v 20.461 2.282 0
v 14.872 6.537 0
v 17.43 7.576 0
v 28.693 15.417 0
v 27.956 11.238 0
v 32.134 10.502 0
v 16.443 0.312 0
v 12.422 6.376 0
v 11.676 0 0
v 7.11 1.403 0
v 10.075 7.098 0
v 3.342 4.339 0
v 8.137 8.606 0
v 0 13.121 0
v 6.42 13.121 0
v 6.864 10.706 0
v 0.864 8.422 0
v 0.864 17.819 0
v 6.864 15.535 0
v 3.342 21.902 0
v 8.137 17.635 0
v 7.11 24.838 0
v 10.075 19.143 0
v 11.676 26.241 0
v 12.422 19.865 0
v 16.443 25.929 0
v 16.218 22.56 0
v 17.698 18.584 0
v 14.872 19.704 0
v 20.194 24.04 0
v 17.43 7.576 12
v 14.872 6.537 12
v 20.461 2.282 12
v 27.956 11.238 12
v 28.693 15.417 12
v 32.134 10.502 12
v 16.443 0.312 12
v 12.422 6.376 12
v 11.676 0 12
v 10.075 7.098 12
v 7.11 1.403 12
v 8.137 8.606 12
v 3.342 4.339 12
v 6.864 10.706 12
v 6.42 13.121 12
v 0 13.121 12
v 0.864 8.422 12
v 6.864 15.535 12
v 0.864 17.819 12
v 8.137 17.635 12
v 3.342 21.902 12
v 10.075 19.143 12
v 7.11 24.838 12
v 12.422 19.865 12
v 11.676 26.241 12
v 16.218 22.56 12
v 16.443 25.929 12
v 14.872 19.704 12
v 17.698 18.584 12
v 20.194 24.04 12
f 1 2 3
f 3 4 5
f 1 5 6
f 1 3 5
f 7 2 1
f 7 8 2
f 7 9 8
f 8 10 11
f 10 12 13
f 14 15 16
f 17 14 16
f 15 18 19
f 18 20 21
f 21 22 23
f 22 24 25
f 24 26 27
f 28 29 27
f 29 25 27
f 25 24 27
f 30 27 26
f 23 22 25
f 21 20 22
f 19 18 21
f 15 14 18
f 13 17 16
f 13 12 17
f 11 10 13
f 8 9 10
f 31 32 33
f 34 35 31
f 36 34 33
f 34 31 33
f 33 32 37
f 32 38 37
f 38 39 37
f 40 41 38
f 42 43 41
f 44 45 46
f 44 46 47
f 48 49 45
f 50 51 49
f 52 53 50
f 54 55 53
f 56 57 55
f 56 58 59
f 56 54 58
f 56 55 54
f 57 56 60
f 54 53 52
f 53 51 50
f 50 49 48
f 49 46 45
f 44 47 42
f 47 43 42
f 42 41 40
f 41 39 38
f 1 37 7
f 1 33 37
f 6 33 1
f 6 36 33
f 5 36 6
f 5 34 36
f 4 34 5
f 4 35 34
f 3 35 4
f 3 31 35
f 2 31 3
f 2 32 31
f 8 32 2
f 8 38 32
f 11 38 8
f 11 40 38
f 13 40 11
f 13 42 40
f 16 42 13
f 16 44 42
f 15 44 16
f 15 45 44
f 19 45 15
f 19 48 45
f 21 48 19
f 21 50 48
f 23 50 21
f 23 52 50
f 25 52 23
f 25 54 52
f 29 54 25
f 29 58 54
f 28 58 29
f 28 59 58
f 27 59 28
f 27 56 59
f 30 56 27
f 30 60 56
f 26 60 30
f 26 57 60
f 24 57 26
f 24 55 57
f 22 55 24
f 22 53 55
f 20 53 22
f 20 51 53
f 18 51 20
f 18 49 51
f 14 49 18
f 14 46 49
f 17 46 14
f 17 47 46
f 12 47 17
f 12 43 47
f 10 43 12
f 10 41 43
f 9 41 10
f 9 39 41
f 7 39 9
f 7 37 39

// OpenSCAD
$fn = 32;

// ----------------------------------------------------------------------
// Eye lug: ring_tail, 12 mm thick
// ----------------------------------------------------------------------

// --- parameters (mm) ---
profile_height = 12;      // extrusion height
profile_points = 30;      // points of the closed outline

profile = [[16.218, 22.56], [20.194, 24.04], [16.443, 25.929], [11.676, 26.241], [7.11, 24.838], [3.342, 21.902], [0.864, 17.819], [0, 13.121], [0.864, 8.422], [3.342, 4.339], [7.11, 1.403], [11.676, 0], [16.443, 0.312], [20.461, 2.282], [32.134, 10.502], [27.956, 11.238], [28.693, 15.417], [17.43, 7.576], [14.872, 6.537], [12.422, 6.376], [10.075, 7.098], [8.137, 8.606], [6.864, 10.706], [6.42, 13.121], [6.864, 15.535], [8.137, 17.635], [10.075, 19.143], [12.422, 19.865], [14.872, 19.704], [17.698, 18.584]];  // single closed polygon, 30 points, counter clockwise

// --- the one profile operation ---
linear_extrude(height = profile_height) polygon(points = profile);
